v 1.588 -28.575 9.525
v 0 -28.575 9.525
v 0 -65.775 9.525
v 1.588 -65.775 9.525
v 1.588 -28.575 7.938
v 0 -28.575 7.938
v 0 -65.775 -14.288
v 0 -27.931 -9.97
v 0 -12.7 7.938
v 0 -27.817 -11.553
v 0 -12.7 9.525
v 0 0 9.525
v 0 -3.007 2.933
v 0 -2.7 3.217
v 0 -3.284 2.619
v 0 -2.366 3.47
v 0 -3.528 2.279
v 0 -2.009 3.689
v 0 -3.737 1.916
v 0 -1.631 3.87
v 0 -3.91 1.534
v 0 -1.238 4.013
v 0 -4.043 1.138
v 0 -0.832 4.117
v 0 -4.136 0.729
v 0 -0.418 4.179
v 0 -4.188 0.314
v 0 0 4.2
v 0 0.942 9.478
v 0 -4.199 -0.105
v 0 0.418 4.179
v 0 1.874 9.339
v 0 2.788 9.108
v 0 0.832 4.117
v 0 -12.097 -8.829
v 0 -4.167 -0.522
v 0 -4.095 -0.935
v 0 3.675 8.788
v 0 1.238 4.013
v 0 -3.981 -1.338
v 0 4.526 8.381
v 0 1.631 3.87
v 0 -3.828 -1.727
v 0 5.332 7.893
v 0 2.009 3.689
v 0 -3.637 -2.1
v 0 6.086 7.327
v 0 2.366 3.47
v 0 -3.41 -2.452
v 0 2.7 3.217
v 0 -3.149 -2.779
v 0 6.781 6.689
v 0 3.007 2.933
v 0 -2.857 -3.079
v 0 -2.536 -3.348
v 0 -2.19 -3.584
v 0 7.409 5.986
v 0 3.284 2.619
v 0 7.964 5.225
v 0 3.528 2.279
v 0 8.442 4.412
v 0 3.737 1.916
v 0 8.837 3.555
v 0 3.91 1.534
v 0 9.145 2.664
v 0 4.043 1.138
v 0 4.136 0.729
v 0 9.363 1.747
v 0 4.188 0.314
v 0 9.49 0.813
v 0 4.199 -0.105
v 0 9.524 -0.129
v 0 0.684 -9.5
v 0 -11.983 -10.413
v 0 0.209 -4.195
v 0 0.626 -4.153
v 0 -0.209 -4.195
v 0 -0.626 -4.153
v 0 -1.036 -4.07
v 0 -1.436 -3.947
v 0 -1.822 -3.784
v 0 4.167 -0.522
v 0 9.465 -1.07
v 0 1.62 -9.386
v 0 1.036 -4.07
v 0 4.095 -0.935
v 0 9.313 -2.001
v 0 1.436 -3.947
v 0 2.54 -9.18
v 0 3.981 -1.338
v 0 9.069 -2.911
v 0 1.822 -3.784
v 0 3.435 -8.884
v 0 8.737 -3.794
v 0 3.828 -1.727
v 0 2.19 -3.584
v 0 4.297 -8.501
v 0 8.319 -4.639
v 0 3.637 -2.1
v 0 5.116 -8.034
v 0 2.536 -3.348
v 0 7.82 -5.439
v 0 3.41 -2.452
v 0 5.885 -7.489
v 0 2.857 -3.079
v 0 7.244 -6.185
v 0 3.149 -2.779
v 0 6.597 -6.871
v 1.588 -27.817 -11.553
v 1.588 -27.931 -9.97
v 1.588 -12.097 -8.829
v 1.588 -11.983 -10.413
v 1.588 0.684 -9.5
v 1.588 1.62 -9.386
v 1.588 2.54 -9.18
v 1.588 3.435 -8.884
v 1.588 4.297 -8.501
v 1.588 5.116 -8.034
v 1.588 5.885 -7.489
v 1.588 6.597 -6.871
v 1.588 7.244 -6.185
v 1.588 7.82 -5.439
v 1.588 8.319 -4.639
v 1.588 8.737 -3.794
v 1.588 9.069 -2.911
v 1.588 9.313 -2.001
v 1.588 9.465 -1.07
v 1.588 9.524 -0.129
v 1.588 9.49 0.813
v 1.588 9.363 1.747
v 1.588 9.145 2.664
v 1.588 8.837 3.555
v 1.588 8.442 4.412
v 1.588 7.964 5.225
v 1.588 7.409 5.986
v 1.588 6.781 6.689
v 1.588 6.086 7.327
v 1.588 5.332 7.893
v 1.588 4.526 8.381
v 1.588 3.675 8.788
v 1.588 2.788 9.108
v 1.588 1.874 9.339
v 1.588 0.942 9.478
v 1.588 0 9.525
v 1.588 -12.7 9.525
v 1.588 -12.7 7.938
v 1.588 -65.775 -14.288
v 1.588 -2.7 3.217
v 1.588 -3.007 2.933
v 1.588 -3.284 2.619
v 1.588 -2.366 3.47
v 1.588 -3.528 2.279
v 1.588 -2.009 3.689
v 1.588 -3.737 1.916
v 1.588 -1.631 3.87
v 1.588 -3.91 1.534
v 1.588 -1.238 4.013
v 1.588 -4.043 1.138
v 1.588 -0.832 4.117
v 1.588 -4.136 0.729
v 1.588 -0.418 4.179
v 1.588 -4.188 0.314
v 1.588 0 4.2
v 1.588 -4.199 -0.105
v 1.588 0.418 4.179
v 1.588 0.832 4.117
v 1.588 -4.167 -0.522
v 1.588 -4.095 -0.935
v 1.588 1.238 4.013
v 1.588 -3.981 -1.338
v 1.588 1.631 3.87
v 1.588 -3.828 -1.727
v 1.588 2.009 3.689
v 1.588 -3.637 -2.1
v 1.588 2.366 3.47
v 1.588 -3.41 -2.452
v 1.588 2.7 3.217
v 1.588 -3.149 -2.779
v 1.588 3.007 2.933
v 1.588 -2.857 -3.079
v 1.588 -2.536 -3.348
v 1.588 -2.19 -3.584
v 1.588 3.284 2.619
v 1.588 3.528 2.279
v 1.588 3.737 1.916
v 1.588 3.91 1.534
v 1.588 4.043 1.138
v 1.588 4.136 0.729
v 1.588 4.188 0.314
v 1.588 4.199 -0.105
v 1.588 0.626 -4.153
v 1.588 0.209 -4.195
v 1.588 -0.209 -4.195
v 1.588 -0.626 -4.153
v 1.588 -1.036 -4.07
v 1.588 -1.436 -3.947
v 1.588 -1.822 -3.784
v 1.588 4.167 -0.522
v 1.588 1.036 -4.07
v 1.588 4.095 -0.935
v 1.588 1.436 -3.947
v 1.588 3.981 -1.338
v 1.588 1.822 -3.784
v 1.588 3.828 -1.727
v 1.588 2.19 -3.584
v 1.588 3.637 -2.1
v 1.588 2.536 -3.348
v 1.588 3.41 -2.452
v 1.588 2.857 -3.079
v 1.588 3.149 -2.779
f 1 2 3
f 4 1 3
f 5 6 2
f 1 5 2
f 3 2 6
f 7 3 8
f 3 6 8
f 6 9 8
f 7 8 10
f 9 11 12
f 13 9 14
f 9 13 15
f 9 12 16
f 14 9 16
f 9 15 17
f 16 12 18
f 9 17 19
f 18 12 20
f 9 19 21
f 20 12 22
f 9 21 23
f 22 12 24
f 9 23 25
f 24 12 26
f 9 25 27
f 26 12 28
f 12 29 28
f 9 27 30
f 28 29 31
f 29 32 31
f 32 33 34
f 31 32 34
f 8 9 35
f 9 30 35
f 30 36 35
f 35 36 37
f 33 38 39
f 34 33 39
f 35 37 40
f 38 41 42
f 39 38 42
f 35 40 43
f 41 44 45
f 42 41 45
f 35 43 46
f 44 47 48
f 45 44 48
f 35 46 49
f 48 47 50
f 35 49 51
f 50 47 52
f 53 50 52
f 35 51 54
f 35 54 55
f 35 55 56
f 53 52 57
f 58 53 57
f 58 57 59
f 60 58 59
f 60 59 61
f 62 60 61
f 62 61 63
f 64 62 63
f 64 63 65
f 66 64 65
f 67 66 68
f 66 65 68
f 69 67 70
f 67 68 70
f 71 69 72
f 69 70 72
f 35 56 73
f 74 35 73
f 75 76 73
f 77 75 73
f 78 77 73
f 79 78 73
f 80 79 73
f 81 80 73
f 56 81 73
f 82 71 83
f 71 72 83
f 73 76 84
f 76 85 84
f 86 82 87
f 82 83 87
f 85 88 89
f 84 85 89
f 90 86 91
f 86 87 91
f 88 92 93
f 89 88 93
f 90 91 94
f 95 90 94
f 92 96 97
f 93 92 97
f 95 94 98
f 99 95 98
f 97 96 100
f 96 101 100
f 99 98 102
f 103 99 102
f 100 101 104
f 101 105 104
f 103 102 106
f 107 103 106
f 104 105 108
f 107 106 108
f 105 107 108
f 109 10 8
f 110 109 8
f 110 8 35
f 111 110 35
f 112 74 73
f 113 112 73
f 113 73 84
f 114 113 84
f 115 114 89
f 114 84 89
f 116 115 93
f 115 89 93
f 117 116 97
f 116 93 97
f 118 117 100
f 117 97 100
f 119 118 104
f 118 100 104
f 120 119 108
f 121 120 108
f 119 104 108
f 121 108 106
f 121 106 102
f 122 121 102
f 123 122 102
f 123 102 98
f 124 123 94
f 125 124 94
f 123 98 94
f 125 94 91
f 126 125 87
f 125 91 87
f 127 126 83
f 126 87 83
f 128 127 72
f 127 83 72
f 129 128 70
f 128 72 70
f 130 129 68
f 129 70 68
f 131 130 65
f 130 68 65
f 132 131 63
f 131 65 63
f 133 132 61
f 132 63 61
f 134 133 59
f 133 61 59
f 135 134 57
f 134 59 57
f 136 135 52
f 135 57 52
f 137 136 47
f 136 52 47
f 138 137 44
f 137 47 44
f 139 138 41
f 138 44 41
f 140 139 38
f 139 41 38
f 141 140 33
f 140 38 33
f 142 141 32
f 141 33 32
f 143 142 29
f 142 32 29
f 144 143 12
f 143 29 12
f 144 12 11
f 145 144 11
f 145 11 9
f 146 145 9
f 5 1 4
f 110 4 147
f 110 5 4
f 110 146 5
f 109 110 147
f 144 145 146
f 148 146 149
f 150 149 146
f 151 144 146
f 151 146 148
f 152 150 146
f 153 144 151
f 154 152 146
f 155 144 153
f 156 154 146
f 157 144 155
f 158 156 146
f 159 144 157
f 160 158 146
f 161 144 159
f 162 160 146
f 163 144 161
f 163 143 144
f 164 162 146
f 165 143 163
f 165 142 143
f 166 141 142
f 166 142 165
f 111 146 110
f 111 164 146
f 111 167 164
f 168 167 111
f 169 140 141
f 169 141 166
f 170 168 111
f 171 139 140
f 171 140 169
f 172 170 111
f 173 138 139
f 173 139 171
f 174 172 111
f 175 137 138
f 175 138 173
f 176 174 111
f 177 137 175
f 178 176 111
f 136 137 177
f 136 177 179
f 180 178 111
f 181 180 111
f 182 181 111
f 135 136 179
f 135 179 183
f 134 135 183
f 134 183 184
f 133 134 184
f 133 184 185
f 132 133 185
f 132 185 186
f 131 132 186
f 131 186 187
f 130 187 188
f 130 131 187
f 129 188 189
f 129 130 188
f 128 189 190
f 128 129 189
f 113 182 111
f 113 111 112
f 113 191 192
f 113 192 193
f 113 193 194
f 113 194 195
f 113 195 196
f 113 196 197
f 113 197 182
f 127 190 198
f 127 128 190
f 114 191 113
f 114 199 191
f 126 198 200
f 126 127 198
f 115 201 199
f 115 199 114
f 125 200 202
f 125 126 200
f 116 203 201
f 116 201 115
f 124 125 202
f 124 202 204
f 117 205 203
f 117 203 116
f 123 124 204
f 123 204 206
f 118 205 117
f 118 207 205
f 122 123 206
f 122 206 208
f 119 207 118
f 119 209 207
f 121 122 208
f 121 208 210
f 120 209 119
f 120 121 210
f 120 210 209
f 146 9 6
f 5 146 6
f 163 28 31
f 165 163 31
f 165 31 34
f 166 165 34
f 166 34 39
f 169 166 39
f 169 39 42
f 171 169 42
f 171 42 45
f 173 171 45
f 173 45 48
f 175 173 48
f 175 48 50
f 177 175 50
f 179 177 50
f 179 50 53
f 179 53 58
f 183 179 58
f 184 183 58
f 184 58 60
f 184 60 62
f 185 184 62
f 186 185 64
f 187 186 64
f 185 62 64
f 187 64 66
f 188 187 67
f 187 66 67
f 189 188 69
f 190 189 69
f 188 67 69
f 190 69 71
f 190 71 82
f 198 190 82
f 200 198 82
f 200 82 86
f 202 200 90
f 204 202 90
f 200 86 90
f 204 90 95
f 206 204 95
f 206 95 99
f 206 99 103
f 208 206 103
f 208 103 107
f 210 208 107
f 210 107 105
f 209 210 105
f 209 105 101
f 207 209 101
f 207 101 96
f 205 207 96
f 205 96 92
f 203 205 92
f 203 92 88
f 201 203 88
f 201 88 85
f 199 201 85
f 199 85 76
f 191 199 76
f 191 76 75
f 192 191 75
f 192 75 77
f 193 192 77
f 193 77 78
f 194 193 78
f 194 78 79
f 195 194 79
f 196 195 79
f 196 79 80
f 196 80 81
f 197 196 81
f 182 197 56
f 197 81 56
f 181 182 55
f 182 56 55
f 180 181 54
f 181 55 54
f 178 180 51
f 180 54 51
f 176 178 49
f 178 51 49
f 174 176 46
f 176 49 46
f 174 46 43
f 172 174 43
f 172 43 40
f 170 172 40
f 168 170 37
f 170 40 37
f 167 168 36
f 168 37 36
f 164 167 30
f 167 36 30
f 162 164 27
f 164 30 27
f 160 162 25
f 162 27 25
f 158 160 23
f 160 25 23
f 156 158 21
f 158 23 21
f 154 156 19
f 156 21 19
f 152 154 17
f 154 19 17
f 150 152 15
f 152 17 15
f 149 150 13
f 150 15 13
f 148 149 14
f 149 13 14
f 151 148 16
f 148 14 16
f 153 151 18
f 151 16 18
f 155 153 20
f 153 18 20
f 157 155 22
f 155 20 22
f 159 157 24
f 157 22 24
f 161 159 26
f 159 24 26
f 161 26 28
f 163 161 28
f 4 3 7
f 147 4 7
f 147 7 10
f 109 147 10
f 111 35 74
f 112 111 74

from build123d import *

# Parameters (mm, degrees)
BOSS_EXTRUDE1_DEPTH  = 1.5875
M8_CLEARANCE_HOLE1_D = 8.4


with BuildPart() as part:
    # Sketch1 → Boss-Extrude1 (new body)
    with BuildSketch(Plane(origin=(0, 0, 0), x_dir=(0, 0, -1), z_dir=(1, 0, 0))):
        with BuildLine():
            Line((-9.525, -65.774638339), (0, -65.774638339))
            Line((0, -65.774638339), (14.2875, -65.774638339))
            Line((14.2875, -65.774638339), (11.553356238, -27.816833207))
            Line((11.553356238, -27.816833207), (9.96995864, -27.930887132))
            Line((9.96995864, -27.930887132), (8.829419389, -12.096911155))
            Line((8.829419389, -12.096911155), (10.412816987, -11.98285723))
            Line((10.412816987, -11.98285723), (9.500385586, 0.684323551))
            ThreePointArc((9.500385586, 0.684323551), (-0.342383043, 9.518844407), (-9.525, 0))
            Line((-9.525, 0), (-9.525, -12.7))
            Line((-9.525, -12.7), (-7.9375, -12.7))
            Line((-7.9375, -12.7), (-7.9375, -28.575))
            Line((-7.9375, -28.575), (-9.525, -28.575))
            Line((-9.525, -28.575), (-9.525, -65.774638339))
        make_face()
    extrude(amount=BOSS_EXTRUDE1_DEPTH)

    # M8 Clearance Hole1 (through all)
    with Locations(Plane(origin=(1.5875, 0, 0), x_dir=(0, 0, -1), z_dir=(1, 0, 0))):
        with Locations((0, 0)):
            Hole(M8_CLEARANCE_HOLE1_D / 2)


solid = part.part
